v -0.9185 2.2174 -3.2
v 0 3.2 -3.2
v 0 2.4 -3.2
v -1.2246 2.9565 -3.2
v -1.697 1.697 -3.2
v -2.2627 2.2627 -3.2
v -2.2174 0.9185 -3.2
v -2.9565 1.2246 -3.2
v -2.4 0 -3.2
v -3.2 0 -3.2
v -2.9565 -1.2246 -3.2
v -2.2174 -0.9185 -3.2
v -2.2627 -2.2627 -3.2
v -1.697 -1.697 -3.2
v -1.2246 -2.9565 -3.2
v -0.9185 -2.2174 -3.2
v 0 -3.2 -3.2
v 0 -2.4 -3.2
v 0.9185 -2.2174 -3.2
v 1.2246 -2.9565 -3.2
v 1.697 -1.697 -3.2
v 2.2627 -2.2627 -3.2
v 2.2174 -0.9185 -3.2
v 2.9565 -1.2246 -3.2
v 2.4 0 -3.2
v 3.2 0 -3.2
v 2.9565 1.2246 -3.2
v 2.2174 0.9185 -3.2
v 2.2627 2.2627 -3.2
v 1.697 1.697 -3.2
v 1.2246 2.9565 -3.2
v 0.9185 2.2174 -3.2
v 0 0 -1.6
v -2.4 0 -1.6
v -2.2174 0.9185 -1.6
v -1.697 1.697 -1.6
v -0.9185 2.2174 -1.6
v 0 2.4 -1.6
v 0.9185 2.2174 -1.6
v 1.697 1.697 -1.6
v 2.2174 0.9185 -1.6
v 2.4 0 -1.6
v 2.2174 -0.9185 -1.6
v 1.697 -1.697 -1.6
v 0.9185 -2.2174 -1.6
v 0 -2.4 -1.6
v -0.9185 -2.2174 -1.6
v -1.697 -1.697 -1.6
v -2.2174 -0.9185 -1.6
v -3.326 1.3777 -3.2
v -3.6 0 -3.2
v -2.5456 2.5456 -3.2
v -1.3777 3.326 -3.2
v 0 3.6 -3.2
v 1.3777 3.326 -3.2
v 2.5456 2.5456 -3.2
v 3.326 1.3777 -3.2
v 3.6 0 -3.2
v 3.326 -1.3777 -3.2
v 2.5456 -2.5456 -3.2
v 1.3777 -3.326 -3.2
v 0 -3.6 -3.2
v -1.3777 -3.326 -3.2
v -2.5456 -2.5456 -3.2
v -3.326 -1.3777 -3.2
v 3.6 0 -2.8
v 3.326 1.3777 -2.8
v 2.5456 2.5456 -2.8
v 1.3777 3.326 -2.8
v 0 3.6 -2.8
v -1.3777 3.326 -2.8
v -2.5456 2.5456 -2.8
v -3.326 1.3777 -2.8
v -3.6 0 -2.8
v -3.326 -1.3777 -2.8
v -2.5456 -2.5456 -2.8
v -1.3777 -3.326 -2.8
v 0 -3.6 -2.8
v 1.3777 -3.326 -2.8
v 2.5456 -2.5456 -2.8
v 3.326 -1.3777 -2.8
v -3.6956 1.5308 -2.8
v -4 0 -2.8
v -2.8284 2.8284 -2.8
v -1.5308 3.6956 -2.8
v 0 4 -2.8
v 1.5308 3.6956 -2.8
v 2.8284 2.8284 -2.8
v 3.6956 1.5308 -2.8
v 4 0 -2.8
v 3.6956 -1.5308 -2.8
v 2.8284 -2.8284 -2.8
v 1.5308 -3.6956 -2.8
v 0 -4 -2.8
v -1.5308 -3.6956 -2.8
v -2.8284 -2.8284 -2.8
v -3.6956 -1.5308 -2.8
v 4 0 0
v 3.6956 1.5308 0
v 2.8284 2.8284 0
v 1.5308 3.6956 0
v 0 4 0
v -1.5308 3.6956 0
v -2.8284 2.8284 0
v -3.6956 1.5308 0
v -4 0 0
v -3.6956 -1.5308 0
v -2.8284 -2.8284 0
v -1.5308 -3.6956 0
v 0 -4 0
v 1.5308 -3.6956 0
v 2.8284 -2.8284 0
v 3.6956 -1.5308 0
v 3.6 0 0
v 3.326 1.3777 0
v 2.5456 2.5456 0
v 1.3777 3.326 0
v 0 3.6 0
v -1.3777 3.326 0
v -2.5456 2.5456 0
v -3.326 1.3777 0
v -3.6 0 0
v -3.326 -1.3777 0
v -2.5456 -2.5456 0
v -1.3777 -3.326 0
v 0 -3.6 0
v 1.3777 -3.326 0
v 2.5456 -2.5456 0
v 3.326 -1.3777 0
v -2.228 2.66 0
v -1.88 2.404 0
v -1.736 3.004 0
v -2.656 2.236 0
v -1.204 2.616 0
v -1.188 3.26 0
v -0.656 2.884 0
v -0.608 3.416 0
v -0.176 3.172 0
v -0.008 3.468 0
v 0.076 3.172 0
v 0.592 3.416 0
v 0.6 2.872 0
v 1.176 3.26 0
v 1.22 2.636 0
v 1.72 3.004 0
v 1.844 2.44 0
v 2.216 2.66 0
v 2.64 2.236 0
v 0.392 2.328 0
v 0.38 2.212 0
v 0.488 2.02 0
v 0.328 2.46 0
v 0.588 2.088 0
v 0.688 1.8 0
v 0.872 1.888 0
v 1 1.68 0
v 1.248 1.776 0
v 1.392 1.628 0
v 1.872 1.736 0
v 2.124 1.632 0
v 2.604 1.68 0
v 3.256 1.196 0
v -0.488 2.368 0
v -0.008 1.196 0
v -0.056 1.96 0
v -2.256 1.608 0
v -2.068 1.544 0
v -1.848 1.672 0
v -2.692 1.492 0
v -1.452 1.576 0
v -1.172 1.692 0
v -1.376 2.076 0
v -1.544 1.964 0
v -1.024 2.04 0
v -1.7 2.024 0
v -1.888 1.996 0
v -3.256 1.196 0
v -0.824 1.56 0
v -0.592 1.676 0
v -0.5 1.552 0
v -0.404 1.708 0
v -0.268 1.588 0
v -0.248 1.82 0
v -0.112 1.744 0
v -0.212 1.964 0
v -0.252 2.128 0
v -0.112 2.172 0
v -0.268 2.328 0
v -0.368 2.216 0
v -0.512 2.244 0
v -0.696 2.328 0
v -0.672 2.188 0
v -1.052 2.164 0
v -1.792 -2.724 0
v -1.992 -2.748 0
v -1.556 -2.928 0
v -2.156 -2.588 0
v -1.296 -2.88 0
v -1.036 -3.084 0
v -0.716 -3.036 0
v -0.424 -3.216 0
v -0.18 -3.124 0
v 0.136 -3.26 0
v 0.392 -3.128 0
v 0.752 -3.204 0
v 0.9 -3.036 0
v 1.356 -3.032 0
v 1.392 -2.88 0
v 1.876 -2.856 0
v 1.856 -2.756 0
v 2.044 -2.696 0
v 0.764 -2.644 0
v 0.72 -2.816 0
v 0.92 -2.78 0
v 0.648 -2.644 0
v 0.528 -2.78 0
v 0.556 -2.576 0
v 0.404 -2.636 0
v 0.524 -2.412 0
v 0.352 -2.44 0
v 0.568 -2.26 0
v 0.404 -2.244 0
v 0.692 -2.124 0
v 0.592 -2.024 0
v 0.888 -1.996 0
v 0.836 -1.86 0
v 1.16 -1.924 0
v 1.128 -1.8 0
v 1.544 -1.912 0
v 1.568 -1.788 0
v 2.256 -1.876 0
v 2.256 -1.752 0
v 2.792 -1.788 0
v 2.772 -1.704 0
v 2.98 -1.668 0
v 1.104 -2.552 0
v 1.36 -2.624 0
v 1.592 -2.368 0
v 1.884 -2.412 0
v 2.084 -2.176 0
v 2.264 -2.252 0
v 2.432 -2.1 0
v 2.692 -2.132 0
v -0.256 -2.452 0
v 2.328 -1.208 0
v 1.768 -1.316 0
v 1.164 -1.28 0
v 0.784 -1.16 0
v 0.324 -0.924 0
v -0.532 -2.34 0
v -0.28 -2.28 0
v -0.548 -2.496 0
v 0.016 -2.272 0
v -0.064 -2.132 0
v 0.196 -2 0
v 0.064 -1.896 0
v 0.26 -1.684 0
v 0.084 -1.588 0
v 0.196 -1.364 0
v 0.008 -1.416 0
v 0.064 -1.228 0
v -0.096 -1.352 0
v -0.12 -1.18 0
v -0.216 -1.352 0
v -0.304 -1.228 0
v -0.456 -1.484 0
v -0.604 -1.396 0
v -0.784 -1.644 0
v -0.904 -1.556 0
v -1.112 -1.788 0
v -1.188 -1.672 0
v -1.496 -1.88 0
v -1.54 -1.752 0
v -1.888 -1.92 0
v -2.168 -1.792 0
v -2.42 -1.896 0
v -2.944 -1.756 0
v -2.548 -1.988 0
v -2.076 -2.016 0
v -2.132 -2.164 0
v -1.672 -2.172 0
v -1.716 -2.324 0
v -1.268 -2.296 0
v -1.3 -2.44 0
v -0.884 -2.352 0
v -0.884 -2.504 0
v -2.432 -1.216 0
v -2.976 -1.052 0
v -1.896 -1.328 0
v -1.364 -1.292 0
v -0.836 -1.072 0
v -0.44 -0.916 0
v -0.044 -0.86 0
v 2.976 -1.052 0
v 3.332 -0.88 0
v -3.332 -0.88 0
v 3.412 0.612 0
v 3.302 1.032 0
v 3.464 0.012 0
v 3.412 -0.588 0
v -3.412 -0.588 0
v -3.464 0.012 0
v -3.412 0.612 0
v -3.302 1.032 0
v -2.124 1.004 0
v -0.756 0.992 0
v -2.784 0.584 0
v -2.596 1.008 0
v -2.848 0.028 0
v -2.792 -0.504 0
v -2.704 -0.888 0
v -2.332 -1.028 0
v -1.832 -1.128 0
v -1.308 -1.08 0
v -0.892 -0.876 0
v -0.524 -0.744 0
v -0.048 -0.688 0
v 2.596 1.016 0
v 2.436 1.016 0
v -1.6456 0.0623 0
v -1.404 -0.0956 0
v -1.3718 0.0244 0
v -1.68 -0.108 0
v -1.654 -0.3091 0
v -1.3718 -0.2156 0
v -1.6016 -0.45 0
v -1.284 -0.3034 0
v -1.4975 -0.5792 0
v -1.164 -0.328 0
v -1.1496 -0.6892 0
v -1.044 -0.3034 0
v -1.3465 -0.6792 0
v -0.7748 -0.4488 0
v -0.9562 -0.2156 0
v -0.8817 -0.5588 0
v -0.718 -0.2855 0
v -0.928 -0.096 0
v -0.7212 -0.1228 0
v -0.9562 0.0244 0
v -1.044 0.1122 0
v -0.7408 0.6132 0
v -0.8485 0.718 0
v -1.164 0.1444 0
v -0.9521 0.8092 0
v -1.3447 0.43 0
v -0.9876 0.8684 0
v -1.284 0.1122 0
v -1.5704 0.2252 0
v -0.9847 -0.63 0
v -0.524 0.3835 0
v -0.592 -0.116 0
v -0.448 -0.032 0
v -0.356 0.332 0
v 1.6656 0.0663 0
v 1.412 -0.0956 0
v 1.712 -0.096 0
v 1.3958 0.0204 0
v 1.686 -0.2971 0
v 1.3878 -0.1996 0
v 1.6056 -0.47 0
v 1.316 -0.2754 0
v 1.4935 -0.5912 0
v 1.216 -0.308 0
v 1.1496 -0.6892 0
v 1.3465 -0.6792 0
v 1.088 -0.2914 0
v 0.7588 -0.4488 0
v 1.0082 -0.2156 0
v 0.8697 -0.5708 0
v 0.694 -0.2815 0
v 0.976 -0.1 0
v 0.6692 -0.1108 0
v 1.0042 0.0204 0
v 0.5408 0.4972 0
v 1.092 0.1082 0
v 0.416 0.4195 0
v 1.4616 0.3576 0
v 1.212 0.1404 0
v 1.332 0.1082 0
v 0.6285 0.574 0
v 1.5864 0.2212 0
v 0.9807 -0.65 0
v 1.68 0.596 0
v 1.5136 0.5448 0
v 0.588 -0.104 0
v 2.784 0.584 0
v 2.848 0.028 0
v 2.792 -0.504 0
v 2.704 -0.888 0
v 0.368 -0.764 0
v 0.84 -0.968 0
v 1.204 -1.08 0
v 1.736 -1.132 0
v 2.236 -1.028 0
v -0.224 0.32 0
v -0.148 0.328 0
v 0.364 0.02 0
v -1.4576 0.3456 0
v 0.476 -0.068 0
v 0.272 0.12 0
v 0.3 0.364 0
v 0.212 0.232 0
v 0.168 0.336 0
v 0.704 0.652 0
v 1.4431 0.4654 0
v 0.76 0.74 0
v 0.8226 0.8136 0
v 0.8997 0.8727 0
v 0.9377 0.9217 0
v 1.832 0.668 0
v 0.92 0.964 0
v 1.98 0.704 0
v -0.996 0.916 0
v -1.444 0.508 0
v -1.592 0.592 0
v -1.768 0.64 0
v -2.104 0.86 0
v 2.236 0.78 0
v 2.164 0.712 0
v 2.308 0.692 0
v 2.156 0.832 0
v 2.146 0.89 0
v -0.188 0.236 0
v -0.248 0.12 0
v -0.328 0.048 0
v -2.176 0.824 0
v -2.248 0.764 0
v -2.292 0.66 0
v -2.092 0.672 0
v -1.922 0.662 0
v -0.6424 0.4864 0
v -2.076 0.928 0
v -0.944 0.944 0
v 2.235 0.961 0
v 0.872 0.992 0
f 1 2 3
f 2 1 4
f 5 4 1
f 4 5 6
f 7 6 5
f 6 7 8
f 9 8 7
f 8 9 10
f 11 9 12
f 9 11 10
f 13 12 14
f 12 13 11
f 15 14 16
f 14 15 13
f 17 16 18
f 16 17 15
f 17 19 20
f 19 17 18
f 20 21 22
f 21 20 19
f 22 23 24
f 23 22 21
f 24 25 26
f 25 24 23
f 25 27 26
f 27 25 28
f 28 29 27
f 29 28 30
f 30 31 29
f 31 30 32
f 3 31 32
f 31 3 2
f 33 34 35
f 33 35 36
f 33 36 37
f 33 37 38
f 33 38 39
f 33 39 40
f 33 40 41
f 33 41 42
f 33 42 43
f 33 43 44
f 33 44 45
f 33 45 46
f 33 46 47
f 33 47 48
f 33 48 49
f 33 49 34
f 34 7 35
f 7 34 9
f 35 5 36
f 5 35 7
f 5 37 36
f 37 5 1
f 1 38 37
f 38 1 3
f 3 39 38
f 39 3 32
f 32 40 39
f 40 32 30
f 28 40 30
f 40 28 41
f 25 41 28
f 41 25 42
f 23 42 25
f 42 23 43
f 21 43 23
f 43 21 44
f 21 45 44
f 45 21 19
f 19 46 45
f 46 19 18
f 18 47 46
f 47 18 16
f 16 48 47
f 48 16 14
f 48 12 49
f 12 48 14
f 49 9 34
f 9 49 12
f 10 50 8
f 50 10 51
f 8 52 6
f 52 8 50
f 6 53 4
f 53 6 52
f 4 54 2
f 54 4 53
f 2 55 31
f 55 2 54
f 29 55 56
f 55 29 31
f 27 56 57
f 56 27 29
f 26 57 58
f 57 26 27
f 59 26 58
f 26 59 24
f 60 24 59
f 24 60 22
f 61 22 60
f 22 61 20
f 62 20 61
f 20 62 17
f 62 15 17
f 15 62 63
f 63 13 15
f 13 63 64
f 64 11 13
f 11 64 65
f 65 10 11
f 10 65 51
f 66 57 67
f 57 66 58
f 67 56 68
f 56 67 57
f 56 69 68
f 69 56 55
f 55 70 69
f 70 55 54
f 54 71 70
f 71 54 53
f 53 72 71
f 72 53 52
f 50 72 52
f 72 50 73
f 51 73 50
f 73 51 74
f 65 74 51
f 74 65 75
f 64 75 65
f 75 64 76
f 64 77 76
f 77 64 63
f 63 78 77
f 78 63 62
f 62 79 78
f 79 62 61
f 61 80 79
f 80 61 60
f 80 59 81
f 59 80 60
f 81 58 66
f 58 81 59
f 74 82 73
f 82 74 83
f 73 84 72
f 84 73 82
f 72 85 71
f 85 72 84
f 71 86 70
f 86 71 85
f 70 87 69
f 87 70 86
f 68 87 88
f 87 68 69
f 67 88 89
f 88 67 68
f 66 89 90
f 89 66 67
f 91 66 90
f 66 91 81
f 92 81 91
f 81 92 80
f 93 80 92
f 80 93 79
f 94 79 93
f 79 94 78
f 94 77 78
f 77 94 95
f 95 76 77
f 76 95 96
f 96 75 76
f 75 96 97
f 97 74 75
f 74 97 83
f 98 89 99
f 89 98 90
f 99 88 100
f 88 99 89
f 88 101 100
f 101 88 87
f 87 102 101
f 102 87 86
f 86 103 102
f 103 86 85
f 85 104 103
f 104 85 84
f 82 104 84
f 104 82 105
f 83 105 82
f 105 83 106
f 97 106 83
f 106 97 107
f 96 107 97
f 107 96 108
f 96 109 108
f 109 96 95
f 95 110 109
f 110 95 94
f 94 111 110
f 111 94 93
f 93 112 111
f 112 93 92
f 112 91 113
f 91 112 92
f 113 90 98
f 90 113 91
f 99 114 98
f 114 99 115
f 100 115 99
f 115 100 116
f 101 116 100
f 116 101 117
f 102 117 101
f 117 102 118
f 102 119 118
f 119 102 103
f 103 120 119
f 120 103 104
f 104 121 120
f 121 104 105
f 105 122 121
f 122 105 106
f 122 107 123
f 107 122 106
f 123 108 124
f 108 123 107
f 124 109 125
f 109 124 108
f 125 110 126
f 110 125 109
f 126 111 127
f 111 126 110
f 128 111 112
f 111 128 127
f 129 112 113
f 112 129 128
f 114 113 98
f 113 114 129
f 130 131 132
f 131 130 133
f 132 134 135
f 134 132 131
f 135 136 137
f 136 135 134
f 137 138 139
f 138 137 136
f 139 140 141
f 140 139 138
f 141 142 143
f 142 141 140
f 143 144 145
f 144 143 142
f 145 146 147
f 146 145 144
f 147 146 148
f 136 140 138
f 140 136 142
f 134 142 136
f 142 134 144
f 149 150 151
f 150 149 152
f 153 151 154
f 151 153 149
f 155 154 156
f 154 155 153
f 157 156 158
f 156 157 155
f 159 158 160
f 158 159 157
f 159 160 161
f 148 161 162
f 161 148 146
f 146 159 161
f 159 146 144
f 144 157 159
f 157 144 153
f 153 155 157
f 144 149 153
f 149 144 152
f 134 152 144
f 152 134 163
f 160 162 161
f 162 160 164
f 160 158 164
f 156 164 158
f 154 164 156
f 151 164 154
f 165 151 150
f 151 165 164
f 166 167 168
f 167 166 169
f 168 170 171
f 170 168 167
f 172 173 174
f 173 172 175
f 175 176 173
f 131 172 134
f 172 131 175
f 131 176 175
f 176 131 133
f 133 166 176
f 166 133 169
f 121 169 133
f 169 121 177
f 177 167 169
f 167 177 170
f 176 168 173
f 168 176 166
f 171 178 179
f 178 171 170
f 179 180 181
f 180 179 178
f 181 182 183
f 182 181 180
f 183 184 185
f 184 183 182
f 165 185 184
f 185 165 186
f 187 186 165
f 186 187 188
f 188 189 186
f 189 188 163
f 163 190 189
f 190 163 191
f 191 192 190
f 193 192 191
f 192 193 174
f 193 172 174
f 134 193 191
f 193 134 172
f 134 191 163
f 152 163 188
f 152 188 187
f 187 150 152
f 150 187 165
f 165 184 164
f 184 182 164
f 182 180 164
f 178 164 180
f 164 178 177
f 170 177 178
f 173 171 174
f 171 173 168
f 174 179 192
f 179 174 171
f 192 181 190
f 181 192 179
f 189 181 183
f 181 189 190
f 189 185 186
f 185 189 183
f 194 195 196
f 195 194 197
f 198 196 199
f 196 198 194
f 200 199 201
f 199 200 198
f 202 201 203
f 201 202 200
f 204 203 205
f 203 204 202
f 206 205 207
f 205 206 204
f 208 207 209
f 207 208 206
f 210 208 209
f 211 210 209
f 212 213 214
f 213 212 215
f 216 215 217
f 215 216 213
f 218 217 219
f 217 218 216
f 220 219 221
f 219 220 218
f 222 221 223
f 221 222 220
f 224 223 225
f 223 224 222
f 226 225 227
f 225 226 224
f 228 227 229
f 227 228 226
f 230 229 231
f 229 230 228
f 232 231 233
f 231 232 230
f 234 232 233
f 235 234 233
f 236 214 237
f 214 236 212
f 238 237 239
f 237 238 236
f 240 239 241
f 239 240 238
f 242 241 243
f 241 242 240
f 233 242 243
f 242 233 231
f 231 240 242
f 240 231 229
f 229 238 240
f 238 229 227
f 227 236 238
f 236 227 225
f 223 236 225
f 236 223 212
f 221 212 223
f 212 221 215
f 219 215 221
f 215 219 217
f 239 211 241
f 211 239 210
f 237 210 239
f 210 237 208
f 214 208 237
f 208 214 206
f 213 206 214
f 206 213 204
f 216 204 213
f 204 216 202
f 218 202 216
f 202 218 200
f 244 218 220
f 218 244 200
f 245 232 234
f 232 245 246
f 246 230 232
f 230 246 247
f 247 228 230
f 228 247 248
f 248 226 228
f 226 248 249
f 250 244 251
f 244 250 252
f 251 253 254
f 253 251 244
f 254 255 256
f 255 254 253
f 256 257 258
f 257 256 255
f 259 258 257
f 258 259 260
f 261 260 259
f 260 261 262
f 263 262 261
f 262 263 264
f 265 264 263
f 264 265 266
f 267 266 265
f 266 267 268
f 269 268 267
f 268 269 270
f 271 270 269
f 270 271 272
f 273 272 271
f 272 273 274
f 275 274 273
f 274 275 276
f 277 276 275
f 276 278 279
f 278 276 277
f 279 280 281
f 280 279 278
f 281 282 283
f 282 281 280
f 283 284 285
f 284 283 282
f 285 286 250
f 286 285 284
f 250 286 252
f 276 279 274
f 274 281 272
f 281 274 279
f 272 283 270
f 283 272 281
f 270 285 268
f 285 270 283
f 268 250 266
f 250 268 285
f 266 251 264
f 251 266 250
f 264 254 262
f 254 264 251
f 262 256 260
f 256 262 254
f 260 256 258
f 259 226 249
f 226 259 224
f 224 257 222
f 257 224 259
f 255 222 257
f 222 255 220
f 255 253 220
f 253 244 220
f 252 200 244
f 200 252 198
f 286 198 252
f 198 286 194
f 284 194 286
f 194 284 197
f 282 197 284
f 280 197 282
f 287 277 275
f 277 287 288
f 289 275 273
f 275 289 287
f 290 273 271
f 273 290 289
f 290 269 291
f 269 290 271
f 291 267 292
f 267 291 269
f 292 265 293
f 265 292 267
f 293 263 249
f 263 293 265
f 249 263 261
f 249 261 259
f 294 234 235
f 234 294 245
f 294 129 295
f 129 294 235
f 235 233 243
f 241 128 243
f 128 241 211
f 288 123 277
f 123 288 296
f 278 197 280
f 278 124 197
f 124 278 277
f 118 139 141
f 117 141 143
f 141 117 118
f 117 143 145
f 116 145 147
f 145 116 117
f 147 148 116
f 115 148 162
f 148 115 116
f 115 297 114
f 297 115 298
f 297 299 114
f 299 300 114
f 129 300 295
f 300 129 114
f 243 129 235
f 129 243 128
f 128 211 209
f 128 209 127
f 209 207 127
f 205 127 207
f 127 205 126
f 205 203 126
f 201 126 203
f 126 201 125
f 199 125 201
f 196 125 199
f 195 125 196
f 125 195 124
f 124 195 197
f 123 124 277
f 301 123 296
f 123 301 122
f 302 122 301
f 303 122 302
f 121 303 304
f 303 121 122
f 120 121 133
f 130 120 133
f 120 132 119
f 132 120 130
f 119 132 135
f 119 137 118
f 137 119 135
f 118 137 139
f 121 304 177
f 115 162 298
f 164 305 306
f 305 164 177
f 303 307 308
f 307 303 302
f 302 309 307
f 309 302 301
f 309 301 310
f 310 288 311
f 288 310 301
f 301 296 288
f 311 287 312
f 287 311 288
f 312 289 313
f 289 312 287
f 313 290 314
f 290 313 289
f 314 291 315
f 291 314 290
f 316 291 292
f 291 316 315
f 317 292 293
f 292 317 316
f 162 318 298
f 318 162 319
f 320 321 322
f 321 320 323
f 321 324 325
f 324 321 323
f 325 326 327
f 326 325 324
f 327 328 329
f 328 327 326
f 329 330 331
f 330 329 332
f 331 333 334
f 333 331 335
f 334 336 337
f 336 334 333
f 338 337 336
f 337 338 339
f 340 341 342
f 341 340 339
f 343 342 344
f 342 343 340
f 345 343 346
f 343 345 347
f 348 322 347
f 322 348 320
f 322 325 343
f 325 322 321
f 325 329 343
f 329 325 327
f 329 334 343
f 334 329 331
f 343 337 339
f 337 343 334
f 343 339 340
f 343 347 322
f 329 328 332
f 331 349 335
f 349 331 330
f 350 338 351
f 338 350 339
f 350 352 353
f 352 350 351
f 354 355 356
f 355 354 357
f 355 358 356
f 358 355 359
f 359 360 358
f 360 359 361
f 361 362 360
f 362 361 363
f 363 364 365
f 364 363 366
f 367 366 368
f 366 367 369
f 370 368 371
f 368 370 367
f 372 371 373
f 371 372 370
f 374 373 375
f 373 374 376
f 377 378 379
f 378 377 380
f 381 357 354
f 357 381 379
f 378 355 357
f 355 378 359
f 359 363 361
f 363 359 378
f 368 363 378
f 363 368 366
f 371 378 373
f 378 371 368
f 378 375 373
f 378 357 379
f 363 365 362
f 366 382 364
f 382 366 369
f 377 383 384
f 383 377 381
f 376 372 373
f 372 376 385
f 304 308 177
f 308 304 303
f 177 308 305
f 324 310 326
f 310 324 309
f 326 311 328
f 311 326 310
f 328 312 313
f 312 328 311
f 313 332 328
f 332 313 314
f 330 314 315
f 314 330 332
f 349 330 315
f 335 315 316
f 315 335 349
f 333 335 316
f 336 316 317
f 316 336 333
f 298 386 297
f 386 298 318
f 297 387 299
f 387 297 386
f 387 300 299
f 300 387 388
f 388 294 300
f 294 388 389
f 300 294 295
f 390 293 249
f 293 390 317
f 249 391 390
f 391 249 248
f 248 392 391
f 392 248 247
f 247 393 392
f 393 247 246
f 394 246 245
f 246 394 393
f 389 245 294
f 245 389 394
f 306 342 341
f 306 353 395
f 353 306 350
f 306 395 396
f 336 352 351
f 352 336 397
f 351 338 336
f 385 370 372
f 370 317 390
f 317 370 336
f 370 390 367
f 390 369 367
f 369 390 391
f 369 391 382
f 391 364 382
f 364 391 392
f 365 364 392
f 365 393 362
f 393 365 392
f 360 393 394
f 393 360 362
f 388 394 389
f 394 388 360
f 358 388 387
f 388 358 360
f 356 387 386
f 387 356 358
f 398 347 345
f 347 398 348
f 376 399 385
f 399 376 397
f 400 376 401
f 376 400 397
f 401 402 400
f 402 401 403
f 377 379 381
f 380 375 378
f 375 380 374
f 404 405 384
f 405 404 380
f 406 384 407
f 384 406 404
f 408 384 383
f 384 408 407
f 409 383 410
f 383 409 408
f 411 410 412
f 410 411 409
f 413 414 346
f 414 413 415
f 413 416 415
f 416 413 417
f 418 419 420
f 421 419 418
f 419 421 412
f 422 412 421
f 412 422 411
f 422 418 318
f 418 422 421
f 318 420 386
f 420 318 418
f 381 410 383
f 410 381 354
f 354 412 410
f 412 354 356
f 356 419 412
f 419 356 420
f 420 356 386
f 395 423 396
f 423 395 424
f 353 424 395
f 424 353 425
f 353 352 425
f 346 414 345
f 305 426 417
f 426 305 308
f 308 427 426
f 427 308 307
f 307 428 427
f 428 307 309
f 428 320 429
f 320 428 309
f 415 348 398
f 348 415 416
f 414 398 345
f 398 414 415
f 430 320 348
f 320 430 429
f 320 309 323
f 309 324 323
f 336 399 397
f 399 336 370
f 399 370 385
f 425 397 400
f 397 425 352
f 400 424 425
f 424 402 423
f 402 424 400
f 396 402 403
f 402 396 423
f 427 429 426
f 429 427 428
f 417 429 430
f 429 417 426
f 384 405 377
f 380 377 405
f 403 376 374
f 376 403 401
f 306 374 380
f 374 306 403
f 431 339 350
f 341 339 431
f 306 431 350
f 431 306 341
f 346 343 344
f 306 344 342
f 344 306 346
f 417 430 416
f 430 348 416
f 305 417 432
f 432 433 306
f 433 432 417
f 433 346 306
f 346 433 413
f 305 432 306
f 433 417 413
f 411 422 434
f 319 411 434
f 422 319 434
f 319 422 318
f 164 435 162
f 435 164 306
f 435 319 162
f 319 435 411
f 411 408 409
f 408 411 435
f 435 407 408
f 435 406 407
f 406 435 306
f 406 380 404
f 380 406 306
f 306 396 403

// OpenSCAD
use <../lib.scad>
use <../p/4-4ering.scad>
use <s/98138pn0s01.scad>
use <s/98138s01.scad>
$fa=1; $fs=0.2;
function ldraw_lib__98138pn7(realsolid=false) = [
// 0 Tile  1 x  1 Round with Ninjago Trapped Cole Pattern
// 0 Name: 98138pn7.dat
// 0 Author: Gerald Lasser [GeraldLasser]
// 0 !LDRAW_ORG Part UPDATE 2017-01
// 0 !LICENSE Licensed under CC BY 2.0 and CC BY 4.0 : see CAreadme.txt
// 
// 0 BFC CERTIFY CCW
  [0,"BFC","CERTIFY"],
  [0,"BFC","CCW"],
// 
// 0 !KEYWORDS BrickLink 98138pb049
// 
// 0 !HISTORY 2017-12-30 [PTadmin] Official Update 2017-01
// 
// 
// 1 16 0 0 0 1 0 0 0 1 0 0 0 1 s\98138s01.dat
  [1,16,0,0,0,1,0,0,0,1,0,0,0,1, ldraw_lib__s__98138s01(realsolid)],
// 1 16 0 0 0 9 0 0 0 1 0 0 0 9 4-4ering.dat
  [1,16,0,0,0,9,0,0,0,1,0,0,0,9, ldraw_lib__4_4ering(realsolid)],
// 1 16 0 0 0 1 0 0 0 1 0 0 0 1 s\98138pn0s01.dat
  [1,16,0,0,0,1,0,0,0,1,0,0,0,1, ldraw_lib__s__98138pn0s01(realsolid)],
// 4 0 -5.31 0 2.51 -1.89 0 2.48 -0.02 0 2.99 -8.14 0 2.99
  [4,0,-5.31,0,2.51,-1.89,0,2.48,-0.02,0,2.99,-8.14,0,2.99],
// 4 0 -6.96 0 1.46 -6.49 0 2.52 -8.53 0 1.53 -8.66 0 0.03
  [4,0,-6.96,0,1.46,-6.49,0,2.52,-8.53,0,1.53,-8.66,0,0.03],
// 4 0 -7.12 0 0.07 -6.96 0 1.46 -8.66 0 0.03 -8.53 0 -1.47
  [4,0,-7.12,0,0.07,-6.96,0,1.46,-8.66,0,0.03,-8.53,0,-1.47],
// 3 0 -7.12 0 0.07 -8.53 0 -1.47 -6.98 0 -1.26
  [3,0,-7.12,0,0.07,-8.53,0,-1.47,-6.98,0,-1.26],
// 4 0 -6.76 0 -2.22 -6.98 0 -1.26 -8.53 0 -1.47 -7.44 0 -2.63
  [4,0,-6.76,0,-2.22,-6.98,0,-1.26,-8.53,0,-1.47,-7.44,0,-2.63],
// 3 0 -8.53 0 -1.47 -8.33 0 -2.2 -7.44 0 -2.63
  [3,0,-8.53,0,-1.47,-8.33,0,-2.2,-7.44,0,-2.63],
// 4 0 -6.08 0 -3.04 -5.83 0 -2.57 -6.76 0 -2.22 -7.44 0 -2.63
  [4,0,-6.08,0,-3.04,-5.83,0,-2.57,-6.76,0,-2.22,-7.44,0,-2.63],
// 4 0 -4.74 0 -3.32 -4.58 0 -2.82 -5.83 0 -2.57 -6.08 0 -3.04
  [4,0,-4.74,0,-3.32,-4.58,0,-2.82,-5.83,0,-2.57,-6.08,0,-3.04],
// 4 0 -3.41 0 -3.23 -3.27 0 -2.7 -4.58 0 -2.82 -4.74 0 -3.32
  [4,0,-3.41,0,-3.23,-3.27,0,-2.7,-4.58,0,-2.82,-4.74,0,-3.32],
// 4 0 -2.09 0 -2.68 -2.23 0 -2.19 -3.27 0 -2.7 -3.41 0 -3.23
  [4,0,-2.09,0,-2.68,-2.23,0,-2.19,-3.27,0,-2.7,-3.41,0,-3.23],
// 4 0 -1.1 0 -2.29 -1.31 0 -1.86 -2.23 0 -2.19 -2.09 0 -2.68
  [4,0,-1.1,0,-2.29,-1.31,0,-1.86,-2.23,0,-2.19,-2.09,0,-2.68],
// 4 0 -0.11 0 -2.15 -0.12 0 -1.72 -1.31 0 -1.86 -1.1 0 -2.29
  [4,0,-0.11,0,-2.15,-0.12,0,-1.72,-1.31,0,-1.86,-1.1,0,-2.29],
// 4 0 8.14 0 2.99 6.09 0 2.54 6.49 0 2.54 8.255 0 2.58
  [4,0,8.14,0,2.99,6.09,0,2.54,6.49,0,2.54,8.255,0,2.58],
// 4 0 -3.51 0 -0.239 -3.4296 0 0.061 -4.1139 0 0.1557 -4.2 0 -0.27
  [4,0,-3.51,0,-0.239,-3.4296,0,0.061,-4.1139,0,0.1557,-4.2,0,-0.27],
// 4 0 -3.4296 0 -0.539 -3.51 0 -0.239 -4.2 0 -0.27 -4.1349 0 -0.7727
  [4,0,-3.4296,0,-0.539,-3.51,0,-0.239,-4.2,0,-0.27,-4.1349,0,-0.7727],
// 4 0 -3.21 0 -0.7586 -3.4296 0 -0.539 -4.1349 0 -0.7727 -4.0041 0 -1.1251
  [4,0,-3.21,0,-0.7586,-3.4296,0,-0.539,-4.1349,0,-0.7727,-4.0041,0,-1.1251],
// 4 0 -3.21 0 -0.7586 -4.0041 0 -1.1251 -3.7437 0 -1.4479 -2.91 0 -0.82
  [4,0,-3.21,0,-0.7586,-4.0041,0,-1.1251,-3.7437,0,-1.4479,-2.91,0,-0.82],
// 4 0 -2.874 0 -1.723 -2.61 0 -0.7586 -2.91 0 -0.82 -3.3663 0 -1.6979
  [4,0,-2.874,0,-1.723,-2.61,0,-0.7586,-2.91,0,-0.82,-3.3663,0,-1.6979],
// 4 0 -2.3904 0 -0.539 -2.61 0 -0.7586 -2.2043 0 -1.3969 -1.9369 0 -1.1221
  [4,0,-2.3904,0,-0.539,-2.61,0,-0.7586,-2.2043,0,-1.3969,-1.9369,0,-1.1221],
// 4 0 -2.3904 0 -0.539 -1.9369 0 -1.1221 -1.7951 0 -0.7137 -2.32 0 -0.24
  [4,0,-2.3904,0,-0.539,-1.9369,0,-1.1221,-1.7951,0,-0.7137,-2.32,0,-0.24],
// 4 0 -2.32 0 -0.24 -1.7951 0 -0.7137 -1.803 0 -0.307 -2.3904 0 0.061
  [4,0,-2.32,0,-0.24,-1.7951,0,-0.7137,-1.803,0,-0.307,-2.3904,0,0.061],
// 4 0 -2.61 0 0.2806 -2.3904 0 0.061 -1.8519 0 1.5331 -2.1213 0 1.7949
  [4,0,-2.61,0,0.2806,-2.3904,0,0.061,-1.8519,0,1.5331,-2.1213,0,1.7949],
// 4 0 -2.91 0 0.361 -2.61 0 0.2806 -2.1213 0 1.7949 -2.3802 0 2.0229
  [4,0,-2.91,0,0.361,-2.61,0,0.2806,-2.1213,0,1.7949,-2.3802,0,2.0229],
// 4 0 -3.21 0 0.2806 -2.91 0 0.361 -2.469 0 2.171 -3.3617 0 1.0749
  [4,0,-3.21,0,0.2806,-2.91,0,0.361,-2.469,0,2.171,-3.3617,0,1.0749],
// 4 0 -3.4296 0 0.061 -3.21 0 0.2806 -3.9261 0 0.5631 -4.1139 0 0.1557
  [4,0,-3.4296,0,0.061,-3.21,0,0.2806,-3.9261,0,0.5631,-4.1139,0,0.1557],
// 4 14 -2.91 0 0.361 -3.4296 0 0.061 -3.51 0 -0.239 -3.4296 0 -0.539
  [4,14,-2.91,0,0.361,-3.4296,0,0.061,-3.51,0,-0.239,-3.4296,0,-0.539],
// 4 14 -2.91 0 0.361 -3.4296 0 -0.539 -3.21 0 -0.7586 -2.91 0 -0.82
  [4,14,-2.91,0,0.361,-3.4296,0,-0.539,-3.21,0,-0.7586,-2.91,0,-0.82],
// 4 14 -2.91 0 0.361 -2.91 0 -0.82 -2.61 0 -0.7586 -2.3904 0 -0.539
  [4,14,-2.91,0,0.361,-2.91,0,-0.82,-2.61,0,-0.7586,-2.3904,0,-0.539],
// 4 14 -2.91 0 0.361 -2.3904 0 -0.539 -2.32 0 -0.24 -2.3904 0 0.061
  [4,14,-2.91,0,0.361,-2.3904,0,-0.539,-2.32,0,-0.24,-2.3904,0,0.061],
// 3 14 -2.91 0 0.361 -2.3904 0 0.061 -2.61 0 0.2806
  [3,14,-2.91,0,0.361,-2.3904,0,0.061,-2.61,0,0.2806],
// 3 14 -2.91 0 0.361 -3.21 0 0.2806 -3.4296 0 0.061
  [3,14,-2.91,0,0.361,-3.21,0,0.2806,-3.4296,0,0.061],
// 3 0 -2.91 0 -0.82 -3.7437 0 -1.4479 -3.3663 0 -1.6979
  [3,0,-2.91,0,-0.82,-3.7437,0,-1.4479,-3.3663,0,-1.6979],
// 4 0 -2.61 0 -0.7586 -2.874 0 -1.723 -2.4617 0 -1.5749 -2.2043 0 -1.3969
  [4,0,-2.61,0,-0.7586,-2.874,0,-1.723,-2.4617,0,-1.5749,-2.2043,0,-1.3969],
// 4 0 -1.3101 0 0.9587 -2.3904 0 0.061 -1.803 0 -0.307 -1.48 0 -0.29
  [4,0,-1.3101,0,0.9587,-2.3904,0,0.061,-1.803,0,-0.307,-1.48,0,-0.29],
// 4 0 -1.3101 0 0.9587 -1.48 0 -0.29 -1.12 0 -0.08 -0.89 0 0.83
  [4,0,-1.3101,0,0.9587,-1.48,0,-0.29,-1.12,0,-0.08,-0.89,0,0.83],
// 4 0 4.1639 0 0.1657 3.4896 0 0.051 3.53 0 -0.239 4.28 0 -0.24
  [4,0,4.1639,0,0.1657,3.4896,0,0.051,3.53,0,-0.239,4.28,0,-0.24],
// 4 0 4.28 0 -0.24 3.53 0 -0.239 3.4696 0 -0.499 4.2149 0 -0.7427
  [4,0,4.28,0,-0.24,3.53,0,-0.239,3.4696,0,-0.499,4.2149,0,-0.7427],
// 4 0 4.2149 0 -0.7427 3.4696 0 -0.499 3.29 0 -0.6886 4.0141 0 -1.1751
  [4,0,4.2149,0,-0.7427,3.4696,0,-0.499,3.29,0,-0.6886,4.0141,0,-1.1751],
// 4 0 3.7337 0 -1.4779 4.0141 0 -1.1751 3.29 0 -0.6886 3.04 0 -0.77
  [4,0,3.7337,0,-1.4779,4.0141,0,-1.1751,3.29,0,-0.6886,3.04,0,-0.77],
// 4 0 3.04 0 -0.77 2.72 0 -0.7286 2.874 0 -1.723 3.3663 0 -1.6979
  [4,0,3.04,0,-0.77,2.72,0,-0.7286,2.874,0,-1.723,3.3663,0,-1.6979],
// 4 0 2.1743 0 -1.4269 2.72 0 -0.7286 2.5204 0 -0.539 1.8969 0 -1.1221
  [4,0,2.1743,0,-1.4269,2.72,0,-0.7286,2.5204,0,-0.539,1.8969,0,-1.1221],
// 4 0 1.7351 0 -0.7037 1.8969 0 -1.1221 2.5204 0 -0.539 2.44 0 -0.25
  [4,0,1.7351,0,-0.7037,1.8969,0,-1.1221,2.5204,0,-0.539,2.44,0,-0.25],
// 4 0 1.673 0 -0.277 1.7351 0 -0.7037 2.44 0 -0.25 2.5104 0 0.051
  [4,0,1.673,0,-0.277,1.7351,0,-0.7037,2.44,0,-0.25,2.5104,0,0.051],
// 4 0 1.3519 0 1.2431 1.0401 0 1.0487 2.5104 0 0.051 2.73 0 0.2706
  [4,0,1.3519,0,1.2431,1.0401,0,1.0487,2.5104,0,0.051,2.73,0,0.2706],
// 4 0 1.5713 0 1.4349 3.03 0 0.351 3.33 0 0.2706 3.6539 0 0.894
  [4,0,1.5713,0,1.4349,3.03,0,0.351,3.33,0,0.2706,3.6539,0,0.894],
// 4 0 3.9661 0 0.5531 3.33 0 0.2706 3.4896 0 0.051 4.1639 0 0.1657
  [4,0,3.9661,0,0.5531,3.33,0,0.2706,3.4896,0,0.051,4.1639,0,0.1657],
// 4 14 3.53 0 -0.239 3.4896 0 0.051 3.03 0 0.351 3.4696 0 -0.499
  [4,14,3.53,0,-0.239,3.4896,0,0.051,3.03,0,0.351,3.4696,0,-0.499],
// 4 14 3.29 0 -0.6886 3.4696 0 -0.499 3.03 0 0.351 3.04 0 -0.77
  [4,14,3.29,0,-0.6886,3.4696,0,-0.499,3.03,0,0.351,3.04,0,-0.77],
// 4 14 2.72 0 -0.7286 3.04 0 -0.77 3.03 0 0.351 2.5204 0 -0.539
  [4,14,2.72,0,-0.7286,3.04,0,-0.77,3.03,0,0.351,2.5204,0,-0.539],
// 4 14 2.44 0 -0.25 2.5204 0 -0.539 3.03 0 0.351 2.5104 0 0.051
  [4,14,2.44,0,-0.25,2.5204,0,-0.539,3.03,0,0.351,2.5104,0,0.051],
// 3 14 3.03 0 0.351 2.73 0 0.2706 2.5104 0 0.051
  [3,14,3.03,0,0.351,2.73,0,0.2706,2.5104,0,0.051],
// 3 14 3.03 0 0.351 3.4896 0 0.051 3.33 0 0.2706
  [3,14,3.03,0,0.351,3.4896,0,0.051,3.33,0,0.2706],
// 3 0 3.04 0 -0.77 3.3663 0 -1.6979 3.7337 0 -1.4779
  [3,0,3.04,0,-0.77,3.3663,0,-1.6979,3.7337,0,-1.4779],
// 4 0 2.4517 0 -1.6249 2.874 0 -1.723 2.72 0 -0.7286 2.1743 0 -1.4269
  [4,0,2.4517,0,-1.6249,2.874,0,-1.723,2.72,0,-0.7286,2.1743,0,-1.4269],
// 4 14 3.9661 0 0.5531 4.2 0 1.49 3.784 0 1.362 3.6539 0 0.894
  [4,14,3.9661,0,0.5531,4.2,0,1.49,3.784,0,1.362,3.6539,0,0.894],
// 4 0 1.673 0 -0.277 2.5104 0 0.051 1.0401 0 1.0487 1.47 0 -0.26
  [4,0,1.673,0,-0.277,2.5104,0,0.051,1.0401,0,1.0487,1.47,0,-0.26],
// 4 0 -6.49 0 2.52 -8.14 0 2.99 -8.255 0 2.58 -8.53 0 1.53
  [4,0,-6.49,0,2.52,-8.14,0,2.99,-8.255,0,2.58,-8.53,0,1.53],
// 3 0 -8.14 0 2.99 -6.49 0 2.52 -5.31 0 2.51
  [3,0,-8.14,0,2.99,-6.49,0,2.52,-5.31,0,2.51],
// 4 14 -4.1349 0 -0.7727 -7.12 0 0.07 -6.98 0 -1.26 -4.0041 0 -1.1251
  [4,14,-4.1349,0,-0.7727,-7.12,0,0.07,-6.98,0,-1.26,-4.0041,0,-1.1251],
// 4 14 -4.0041 0 -1.1251 -6.98 0 -1.26 -6.76 0 -2.22 -3.7437 0 -1.4479
  [4,14,-4.0041,0,-1.1251,-6.98,0,-1.26,-6.76,0,-2.22,-3.7437,0,-1.4479],
// 4 14 -3.7437 0 -1.4479 -6.76 0 -2.22 -5.83 0 -2.57 -4.58 0 -2.82
  [4,14,-3.7437,0,-1.4479,-6.76,0,-2.22,-5.83,0,-2.57,-4.58,0,-2.82],
// 4 14 -3.3663 0 -1.6979 -3.7437 0 -1.4479 -4.58 0 -2.82 -3.27 0 -2.7
  [4,14,-3.3663,0,-1.6979,-3.7437,0,-1.4479,-4.58,0,-2.82,-3.27,0,-2.7],
// 4 14 -2.874 0 -1.723 -3.3663 0 -1.6979 -3.27 0 -2.7 -2.23 0 -2.19
  [4,14,-2.874,0,-1.723,-3.3663,0,-1.6979,-3.27,0,-2.7,-2.23,0,-2.19],
// 3 14 -2.4617 0 -1.5749 -2.874 0 -1.723 -2.23 0 -2.19
  [3,14,-2.4617,0,-1.5749,-2.874,0,-1.723,-2.23,0,-2.19],
// 4 14 -2.2043 0 -1.3969 -2.4617 0 -1.5749 -2.23 0 -2.19 -1.31 0 -1.86
  [4,14,-2.2043,0,-1.3969,-2.4617,0,-1.5749,-2.23,0,-2.19,-1.31,0,-1.86],
// 3 14 -1.9369 0 -1.1221 -2.2043 0 -1.3969 -1.31 0 -1.86
  [3,14,-1.9369,0,-1.1221,-2.2043,0,-1.3969,-1.31,0,-1.86],
// 4 14 -1.7951 0 -0.7137 -1.9369 0 -1.1221 -1.31 0 -1.86 -0.12 0 -1.72
  [4,14,-1.7951,0,-0.7137,-1.9369,0,-1.1221,-1.31,0,-1.86,-0.12,0,-1.72],
// 4 0 8.53 0 1.53 8.255 0 2.58 6.49 0 2.54 6.96 0 1.46
  [4,0,8.53,0,1.53,8.255,0,2.58,6.49,0,2.54,6.96,0,1.46],
// 4 0 8.66 0 0.03 8.53 0 1.53 6.96 0 1.46 7.12 0 0.07
  [4,0,8.66,0,0.03,8.53,0,1.53,6.96,0,1.46,7.12,0,0.07],
// 4 0 8.53 0 -1.47 8.66 0 0.03 7.12 0 0.07 6.98 0 -1.26
  [4,0,8.53,0,-1.47,8.66,0,0.03,7.12,0,0.07,6.98,0,-1.26],
// 4 0 8.53 0 -1.47 6.98 0 -1.26 6.76 0 -2.22 7.44 0 -2.63
  [4,0,8.53,0,-1.47,6.98,0,-1.26,6.76,0,-2.22,7.44,0,-2.63],
// 3 0 8.53 0 -1.47 7.44 0 -2.63 8.33 0 -2.2
  [3,0,8.53,0,-1.47,7.44,0,-2.63,8.33,0,-2.2],
// 4 0 0.92 0 -1.91 -0.12 0 -1.72 -0.11 0 -2.15 0.81 0 -2.31
  [4,0,0.92,0,-1.91,-0.12,0,-1.72,-0.11,0,-2.15,0.81,0,-2.31],
// 4 0 2.1 0 -2.42 0.92 0 -1.91 0.81 0 -2.31 1.96 0 -2.9
  [4,0,2.1,0,-2.42,0.92,0,-1.91,0.81,0,-2.31,1.96,0,-2.9],
// 4 0 3.01 0 -2.7 2.1 0 -2.42 1.96 0 -2.9 2.91 0 -3.2
  [4,0,3.01,0,-2.7,2.1,0,-2.42,1.96,0,-2.9,2.91,0,-3.2],
// 4 0 4.34 0 -2.83 3.01 0 -2.7 2.91 0 -3.2 4.42 0 -3.29
  [4,0,4.34,0,-2.83,3.01,0,-2.7,2.91,0,-3.2,4.42,0,-3.29],
// 4 0 5.59 0 -2.57 4.34 0 -2.83 4.42 0 -3.29 5.82 0 -3.02
  [4,0,5.59,0,-2.57,4.34,0,-2.83,4.42,0,-3.29,5.82,0,-3.02],
// 4 0 5.82 0 -3.02 7.44 0 -2.63 6.76 0 -2.22 5.59 0 -2.57
  [4,0,5.82,0,-3.02,7.44,0,-2.63,6.76,0,-2.22,5.59,0,-2.57],
// 3 14 -1.89 0 2.48 -2.1213 0 1.7949 -1.8519 0 1.5331
  [3,14,-1.89,0,2.48,-2.1213,0,1.7949,-1.8519,0,1.5331],
// 4 14 -1.89 0 2.48 -1.3101 0 0.9587 -0.89 0 0.83 -0.56 0 0.8
  [4,14,-1.89,0,2.48,-1.3101,0,0.9587,-0.89,0,0.83,-0.56,0,0.8],
// 3 14 -1.89 0 2.48 -0.56 0 0.8 -0.37 0 0.82
  [3,14,-1.89,0,2.48,-0.56,0,0.8,-0.37,0,0.82],
// 4 14 -1.12 0 -0.08 -1.48 0 -0.29 -1.7951 0 -0.7137 0.91 0 0.05
  [4,14,-1.12,0,-0.08,-1.48,0,-0.29,-1.7951,0,-0.7137,0.91,0,0.05],
// 3 14 -1.48 0 -0.29 -1.803 0 -0.307 -1.7951 0 -0.7137
  [3,14,-1.48,0,-0.29,-1.803,0,-0.307,-1.7951,0,-0.7137],
// 3 14 1.47 0 -0.26 1.7351 0 -0.7037 1.673 0 -0.277
  [3,14,1.47,0,-0.26,1.7351,0,-0.7037,1.673,0,-0.277],
// 4 14 1.7351 0 -0.7037 -1.7951 0 -0.7137 -0.12 0 -1.72 0.92 0 -1.91
  [4,14,1.7351,0,-0.7037,-1.7951,0,-0.7137,-0.12,0,-1.72,0.92,0,-1.91],
// 3 14 1.7351 0 -0.7037 0.92 0 -1.91 1.8969 0 -1.1221
  [3,14,1.7351,0,-0.7037,0.92,0,-1.91,1.8969,0,-1.1221],
// 4 14 2.1743 0 -1.4269 1.8969 0 -1.1221 0.92 0 -1.91 2.1 0 -2.42
  [4,14,2.1743,0,-1.4269,1.8969,0,-1.1221,0.92,0,-1.91,2.1,0,-2.42],
// 3 14 2.1743 0 -1.4269 2.1 0 -2.42 2.4517 0 -1.6249
  [3,14,2.1743,0,-1.4269,2.1,0,-2.42,2.4517,0,-1.6249],
// 4 14 2.874 0 -1.723 2.4517 0 -1.6249 2.1 0 -2.42 3.01 0 -2.7
  [4,14,2.874,0,-1.723,2.4517,0,-1.6249,2.1,0,-2.42,3.01,0,-2.7],
// 3 14 3.3663 0 -1.6979 2.874 0 -1.723 3.01 0 -2.7
  [3,14,3.3663,0,-1.6979,2.874,0,-1.723,3.01,0,-2.7],
// 4 14 3.7337 0 -1.4779 3.3663 0 -1.6979 3.01 0 -2.7 4.34 0 -2.83
  [4,14,3.7337,0,-1.4779,3.3663,0,-1.6979,3.01,0,-2.7,4.34,0,-2.83],
// 4 14 3.7337 0 -1.4779 4.34 0 -2.83 5.59 0 -2.57 4.0141 0 -1.1751
  [4,14,3.7337,0,-1.4779,4.34,0,-2.83,5.59,0,-2.57,4.0141,0,-1.1751],
// 4 14 4.0141 0 -1.1751 5.59 0 -2.57 6.76 0 -2.22 6.98 0 -1.26
  [4,14,4.0141,0,-1.1751,5.59,0,-2.57,6.76,0,-2.22,6.98,0,-1.26],
// 4 14 4.2149 0 -0.7427 4.0141 0 -1.1751 6.98 0 -1.26 7.12 0 0.07
  [4,14,4.2149,0,-0.7427,4.0141,0,-1.1751,6.98,0,-1.26,7.12,0,0.07],
// 4 14 4.28 0 -0.24 4.2149 0 -0.7427 7.12 0 0.07 6.96 0 1.46
  [4,14,4.28,0,-0.24,4.2149,0,-0.7427,7.12,0,0.07,6.96,0,1.46],
// 4 0 -3.6439 0 0.864 -3.9261 0 0.5631 -3.21 0 0.2806 -3.3617 0 1.0749
  [4,0,-3.6439,0,0.864,-3.9261,0,0.5631,-3.21,0,0.2806,-3.3617,0,1.0749],
// 4 0 1.19 0 -0.17 1.47 0 -0.26 1.0401 0 1.0487 0.91 0 0.05
  [4,0,1.19,0,-0.17,1.47,0,-0.26,1.0401,0,1.0487,0.91,0,0.05],
// 4 0 0.68 0 0.3 0.91 0 0.05 1.0401 0 1.0487 0.75 0 0.91
  [4,0,0.68,0,0.3,0.91,0,0.05,1.0401,0,1.0487,0.75,0,0.91],
// 4 0 0.53 0 0.58 0.68 0 0.3 0.75 0 0.91 0.42 0 0.84
  [4,0,0.53,0,0.58,0.68,0,0.3,0.75,0,0.91,0.42,0,0.84],
// 3 0 3.6539 0 0.894 3.33 0 0.2706 3.9661 0 0.5531
  [3,0,3.6539,0,0.894,3.33,0,0.2706,3.9661,0,0.5531],
// 4 0 2.73 0 0.2706 3.03 0 0.351 1.5713 0 1.4349 1.3519 0 1.2431
  [4,0,2.73,0,0.2706,3.03,0,0.351,1.5713,0,1.4349,1.3519,0,1.2431],
// 4 0 3.784 0 1.362 1.76 0 1.63 1.5713 0 1.4349 3.6078 0 1.1634
  [4,0,3.784,0,1.362,1.76,0,1.63,1.5713,0,1.4349,3.6078,0,1.1634],
// 4 0 1.9 0 1.85 1.76 0 1.63 3.784 0 1.362 2.0564 0 2.034
  [4,0,1.9,0,1.85,1.76,0,1.63,3.784,0,1.362,2.0564,0,2.034],
// 4 0 2.2493 0 2.1818 2.0564 0 2.034 3.784 0 1.362 4.2 0 1.49
  [4,0,2.2493,0,2.1818,2.0564,0,2.034,3.784,0,1.362,4.2,0,1.49],
// 4 0 2.2493 0 2.1818 4.2 0 1.49 4.58 0 1.67 2.3443 0 2.3042
  [4,0,2.2493,0,2.1818,4.2,0,1.49,4.58,0,1.67,2.3443,0,2.3042],
// 4 0 2.3 0 2.41 2.3443 0 2.3042 4.58 0 1.67 4.95 0 1.76
  [4,0,2.3,0,2.41,2.3443,0,2.3042,4.58,0,1.67,4.95,0,1.76],
// 4 0 -2.49 0 2.29 -3.98 0 1.48 -3.61 0 1.27 -2.469 0 2.171
  [4,0,-2.49,0,2.29,-3.98,0,1.48,-3.61,0,1.27,-2.469,0,2.171],
// 4 0 -4.42 0 1.6 -3.98 0 1.48 -2.49 0 2.29 -5.26 0 2.15
  [4,0,-4.42,0,1.6,-3.98,0,1.48,-2.49,0,2.29,-5.26,0,2.15],
// 3 0 5.59 0 1.95 5.41 0 1.78 5.77 0 1.73
  [3,0,5.59,0,1.95,5.41,0,1.78,5.77,0,1.73],
// 4 0 4.95 0 1.76 5.41 0 1.78 5.59 0 1.95 5.39 0 2.08
  [4,0,4.95,0,1.76,5.41,0,1.78,5.59,0,1.95,5.39,0,2.08],
// 4 0 4.95 0 1.76 5.39 0 2.08 5.365 0 2.225 2.3 0 2.41
  [4,0,4.95,0,1.76,5.39,0,2.08,5.365,0,2.225,2.3,0,2.41],
// 4 14 5.39 0 2.08 5.59 0 1.95 6.49 0 2.54 5.365 0 2.225
  [4,14,5.39,0,2.08,5.59,0,1.95,6.49,0,2.54,5.365,0,2.225],
// 4 14 6.49 0 2.54 5.59 0 1.95 5.77 0 1.73 6.96 0 1.46
  [4,14,6.49,0,2.54,5.59,0,1.95,5.77,0,1.73,6.96,0,1.46],
// 4 14 4.58 0 1.67 4.2 0 1.49 3.9661 0 0.5531 4.1639 0 0.1657
  [4,14,4.58,0,1.67,4.2,0,1.49,3.9661,0,0.5531,4.1639,0,0.1657],
// 4 14 4.95 0 1.76 4.58 0 1.67 4.1639 0 0.1657 4.28 0 -0.24
  [4,14,4.95,0,1.76,4.58,0,1.67,4.1639,0,0.1657,4.28,0,-0.24],
// 4 14 5.41 0 1.78 4.95 0 1.76 4.28 0 -0.24 5.77 0 1.73
  [4,14,5.41,0,1.78,4.95,0,1.76,4.28,0,-0.24,5.77,0,1.73],
// 3 14 5.77 0 1.73 4.28 0 -0.24 6.96 0 1.46
  [3,14,5.77,0,1.73,4.28,0,-0.24,6.96,0,1.46],
// 4 0 -0.47 0 0.59 -0.37 0 0.82 -0.56 0 0.8 -0.62 0 0.3
  [4,0,-0.47,0,0.59,-0.37,0,0.82,-0.56,0,0.8,-0.62,0,0.3],
// 4 0 -0.62 0 0.3 -0.56 0 0.8 -0.89 0 0.83 -0.82 0 0.12
  [4,0,-0.62,0,0.3,-0.56,0,0.8,-0.89,0,0.83,-0.82,0,0.12],
// 3 0 -0.89 0 0.83 -1.12 0 -0.08 -0.82 0 0.12
  [3,0,-0.89,0,0.83,-1.12,0,-0.08,-0.82,0,0.12],
// 3 0 -2.469 0 2.171 -3.61 0 1.27 -3.3617 0 1.0749
  [3,0,-2.469,0,2.171,-3.61,0,1.27,-3.3617,0,1.0749],
// 4 14 -5.31 0 2.51 -6.49 0 2.52 -5.44 0 2.06 -5.26 0 2.15
  [4,14,-5.31,0,2.51,-6.49,0,2.52,-5.44,0,2.06,-5.26,0,2.15],
// 4 14 -5.62 0 1.91 -5.44 0 2.06 -6.49 0 2.52 -6.96 0 1.46
  [4,14,-5.62,0,1.91,-5.44,0,2.06,-6.49,0,2.52,-6.96,0,1.46],
// 4 14 -5.73 0 1.65 -5.62 0 1.91 -6.96 0 1.46 -7.12 0 0.07
  [4,14,-5.73,0,1.65,-5.62,0,1.91,-6.96,0,1.46,-7.12,0,0.07],
// 4 14 -5.23 0 1.68 -5.73 0 1.65 -7.12 0 0.07 -4.1139 0 0.1557
  [4,14,-5.23,0,1.68,-5.73,0,1.65,-7.12,0,0.07,-4.1139,0,0.1557],
// 4 14 -4.42 0 1.6 -3.9261 0 0.5631 -3.6439 0 0.864 -3.98 0 1.48
  [4,14,-4.42,0,1.6,-3.9261,0,0.5631,-3.6439,0,0.864,-3.98,0,1.48],
// 4 14 -3.61 0 1.27 -3.98 0 1.48 -3.6439 0 0.864 -3.3617 0 1.0749
  [4,14,-3.61,0,1.27,-3.98,0,1.48,-3.6439,0,0.864,-3.3617,0,1.0749],
// 4 14 -5.23 0 1.68 -4.1139 0 0.1557 -3.9261 0 0.5631 -4.805 0 1.655
  [4,14,-5.23,0,1.68,-4.1139,0,0.1557,-3.9261,0,0.5631,-4.805,0,1.655],
// 3 14 -4.1139 0 0.1557 -7.12 0 0.07 -4.2 0 -0.27
  [3,14,-4.1139,0,0.1557,-7.12,0,0.07,-4.2,0,-0.27],
// 3 14 -7.12 0 0.07 -4.1349 0 -0.7727 -4.2 0 -0.27
  [3,14,-7.12,0,0.07,-4.1349,0,-0.7727,-4.2,0,-0.27],
// 4 14 1.19 0 -0.17 0.91 0 0.05 -1.7951 0 -0.7137 1.7351 0 -0.7037
  [4,14,1.19,0,-0.17,0.91,0,0.05,-1.7951,0,-0.7137,1.7351,0,-0.7037],
// 3 14 1.19 0 -0.17 1.7351 0 -0.7037 1.47 0 -0.26
  [3,14,1.19,0,-0.17,1.7351,0,-0.7037,1.47,0,-0.26],
// 4 14 -0.82 0 0.12 -1.12 0 -0.08 0.91 0 0.05 0.68 0 0.3
  [4,14,-0.82,0,0.12,-1.12,0,-0.08,0.91,0,0.05,0.68,0,0.3],
// 3 14 0.68 0 0.3 -0.62 0 0.3 -0.82 0 0.12
  [3,14,0.68,0,0.3,-0.62,0,0.3,-0.82,0,0.12],
// 4 14 -0.47 0 0.59 -0.62 0 0.3 0.68 0 0.3 0.53 0 0.58
  [4,14,-0.47,0,0.59,-0.62,0,0.3,0.68,0,0.3,0.53,0,0.58],
// 4 14 -0.47 0 0.59 0.53 0 0.58 0.42 0 0.84 -0.37 0 0.82
  [4,14,-0.47,0,0.59,0.53,0,0.58,0.42,0,0.84,-0.37,0,0.82],
// 4 0 -5.62 0 1.91 -5.73 0 1.65 -5.23 0 1.68 -5.44 0 2.06
  [4,0,-5.62,0,1.91,-5.73,0,1.65,-5.23,0,1.68,-5.44,0,2.06],
// 4 0 -5.26 0 2.15 -5.44 0 2.06 -5.23 0 1.68 -4.805 0 1.655
  [4,0,-5.26,0,2.15,-5.44,0,2.06,-5.23,0,1.68,-4.805,0,1.655],
// 3 14 3.784 0 1.362 3.6078 0 1.1634 3.6539 0 0.894
  [3,14,3.784,0,1.362,3.6078,0,1.1634,3.6539,0,0.894],
// 3 0 1.5713 0 1.4349 3.6539 0 0.894 3.6078 0 1.1634
  [3,0,1.5713,0,1.4349,3.6539,0,0.894,3.6078,0,1.1634],
// 4 14 0.42 0 0.84 0.75 0 0.91 1.0401 0 1.0487 1.3519 0 1.2431
  [4,14,0.42,0,0.84,0.75,0,0.91,1.0401,0,1.0487,1.3519,0,1.2431],
// 4 14 0.42 0 0.84 1.3519 0 1.2431 1.5713 0 1.4349 -1.89 0 2.48
  [4,14,0.42,0,0.84,1.3519,0,1.2431,1.5713,0,1.4349,-1.89,0,2.48],
// 3 0 -1.606 0 1.2159 -2.3904 0 0.061 -1.3101 0 0.9587
  [3,0,-1.606,0,1.2159,-2.3904,0,0.061,-1.3101,0,0.9587],
// 3 0 -1.8519 0 1.5331 -2.3904 0 0.061 -1.606 0 1.2159
  [3,0,-1.8519,0,1.5331,-2.3904,0,0.061,-1.606,0,1.2159],
// 4 14 -1.606 0 1.2159 -1.3101 0 0.9587 -1.89 0 2.48 -1.8519 0 1.5331
  [4,14,-1.606,0,1.2159,-1.3101,0,0.9587,-1.89,0,2.48,-1.8519,0,1.5331],
// 3 0 -2.469 0 2.171 -2.91 0 0.361 -2.3802 0 2.0229
  [3,0,-2.469,0,2.171,-2.91,0,0.361,-2.3802,0,2.0229],
// 4 14 -2.3802 0 2.0229 -2.1213 0 1.7949 -1.89 0 2.48 -2.469 0 2.171
  [4,14,-2.3802,0,2.0229,-2.1213,0,1.7949,-1.89,0,2.48,-2.469,0,2.171],
// 3 0 -5.26 0 2.15 -4.805 0 1.655 -4.42 0 1.6
  [3,0,-5.26,0,2.15,-4.805,0,1.655,-4.42,0,1.6],
// 3 14 -4.805 0 1.655 -3.9261 0 0.5631 -4.42 0 1.6
  [3,14,-4.805,0,1.655,-3.9261,0,0.5631,-4.42,0,1.6],
// 3 14 -5.31 0 2.51 -5.26 0 2.15 -5.19 0 2.32
  [3,14,-5.31,0,2.51,-5.26,0,2.15,-5.19,0,2.32],
// 4 0 -1.89 0 2.48 -5.19 0 2.32 -5.26 0 2.15 -2.36 0 2.36
  [4,0,-1.89,0,2.48,-5.19,0,2.32,-5.26,0,2.15,-2.36,0,2.36],
// 4 14 -2.469 0 2.171 -1.89 0 2.48 -2.36 0 2.36 -2.49 0 2.29
  [4,14,-2.469,0,2.171,-1.89,0,2.48,-2.36,0,2.36,-2.49,0,2.29],
// 3 0 -5.31 0 2.51 -5.19 0 2.32 -1.89 0 2.48
  [3,0,-5.31,0,2.51,-5.19,0,2.32,-1.89,0,2.48],
// 3 0 -2.36 0 2.36 -5.26 0 2.15 -2.49 0 2.29
  [3,0,-2.36,0,2.36,-5.26,0,2.15,-2.49,0,2.29],
// 3 0 2.3 0 2.41 5.365 0 2.225 5.5875 0 2.4025
  [3,0,2.3,0,2.41,5.365,0,2.225,5.5875,0,2.4025],
// 3 0 6.09 0 2.54 2.3 0 2.41 5.5875 0 2.4025
  [3,0,6.09,0,2.54,2.3,0,2.41,5.5875,0,2.4025],
// 4 14 5.5875 0 2.4025 5.365 0 2.225 6.49 0 2.54 6.09 0 2.54
  [4,14,5.5875,0,2.4025,5.365,0,2.225,6.49,0,2.54,6.09,0,2.54],
// 4 0 -0.02 0 2.99 -1.89 0 2.48 2.18 0 2.48 8.14 0 2.99
  [4,0,-0.02,0,2.99,-1.89,0,2.48,2.18,0,2.48,8.14,0,2.99],
// 4 0 8.14 0 2.99 2.18 0 2.48 2.3 0 2.41 6.09 0 2.54
  [4,0,8.14,0,2.99,2.18,0,2.48,2.3,0,2.41,6.09,0,2.54],
// 4 14 2.2493 0 2.1818 2.3443 0 2.3042 2.3 0 2.41 2.18 0 2.48
  [4,14,2.2493,0,2.1818,2.3443,0,2.3042,2.3,0,2.41,2.18,0,2.48],
// 3 14 2.18 0 2.48 2.0564 0 2.034 2.2493 0 2.1818
  [3,14,2.18,0,2.48,2.0564,0,2.034,2.2493,0,2.1818],
// 4 14 1.9 0 1.85 2.0564 0 2.034 2.18 0 2.48 -1.89 0 2.48
  [4,14,1.9,0,1.85,2.0564,0,2.034,2.18,0,2.48,-1.89,0,2.48],
// 4 14 1.76 0 1.63 1.9 0 1.85 -1.89 0 2.48 1.5713 0 1.4349
  [4,14,1.76,0,1.63,1.9,0,1.85,-1.89,0,2.48,1.5713,0,1.4349],
// 3 14 -1.89 0 2.48 -0.37 0 0.82 0.42 0 0.84
  [3,14,-1.89,0,2.48,-0.37,0,0.82,0.42,0,0.84],
];
module ldraw_lib__98138pn7(step=0, col=false, unit=2/5, alt=false, line=0.2, solid=!$preview)
    makepoly(ldraw_lib__98138pn7(solid), step=step, col=col, unit=unit, alt=alt, line=line, solid=solid);
ldraw_lib__98138pn7(line=0.2);
